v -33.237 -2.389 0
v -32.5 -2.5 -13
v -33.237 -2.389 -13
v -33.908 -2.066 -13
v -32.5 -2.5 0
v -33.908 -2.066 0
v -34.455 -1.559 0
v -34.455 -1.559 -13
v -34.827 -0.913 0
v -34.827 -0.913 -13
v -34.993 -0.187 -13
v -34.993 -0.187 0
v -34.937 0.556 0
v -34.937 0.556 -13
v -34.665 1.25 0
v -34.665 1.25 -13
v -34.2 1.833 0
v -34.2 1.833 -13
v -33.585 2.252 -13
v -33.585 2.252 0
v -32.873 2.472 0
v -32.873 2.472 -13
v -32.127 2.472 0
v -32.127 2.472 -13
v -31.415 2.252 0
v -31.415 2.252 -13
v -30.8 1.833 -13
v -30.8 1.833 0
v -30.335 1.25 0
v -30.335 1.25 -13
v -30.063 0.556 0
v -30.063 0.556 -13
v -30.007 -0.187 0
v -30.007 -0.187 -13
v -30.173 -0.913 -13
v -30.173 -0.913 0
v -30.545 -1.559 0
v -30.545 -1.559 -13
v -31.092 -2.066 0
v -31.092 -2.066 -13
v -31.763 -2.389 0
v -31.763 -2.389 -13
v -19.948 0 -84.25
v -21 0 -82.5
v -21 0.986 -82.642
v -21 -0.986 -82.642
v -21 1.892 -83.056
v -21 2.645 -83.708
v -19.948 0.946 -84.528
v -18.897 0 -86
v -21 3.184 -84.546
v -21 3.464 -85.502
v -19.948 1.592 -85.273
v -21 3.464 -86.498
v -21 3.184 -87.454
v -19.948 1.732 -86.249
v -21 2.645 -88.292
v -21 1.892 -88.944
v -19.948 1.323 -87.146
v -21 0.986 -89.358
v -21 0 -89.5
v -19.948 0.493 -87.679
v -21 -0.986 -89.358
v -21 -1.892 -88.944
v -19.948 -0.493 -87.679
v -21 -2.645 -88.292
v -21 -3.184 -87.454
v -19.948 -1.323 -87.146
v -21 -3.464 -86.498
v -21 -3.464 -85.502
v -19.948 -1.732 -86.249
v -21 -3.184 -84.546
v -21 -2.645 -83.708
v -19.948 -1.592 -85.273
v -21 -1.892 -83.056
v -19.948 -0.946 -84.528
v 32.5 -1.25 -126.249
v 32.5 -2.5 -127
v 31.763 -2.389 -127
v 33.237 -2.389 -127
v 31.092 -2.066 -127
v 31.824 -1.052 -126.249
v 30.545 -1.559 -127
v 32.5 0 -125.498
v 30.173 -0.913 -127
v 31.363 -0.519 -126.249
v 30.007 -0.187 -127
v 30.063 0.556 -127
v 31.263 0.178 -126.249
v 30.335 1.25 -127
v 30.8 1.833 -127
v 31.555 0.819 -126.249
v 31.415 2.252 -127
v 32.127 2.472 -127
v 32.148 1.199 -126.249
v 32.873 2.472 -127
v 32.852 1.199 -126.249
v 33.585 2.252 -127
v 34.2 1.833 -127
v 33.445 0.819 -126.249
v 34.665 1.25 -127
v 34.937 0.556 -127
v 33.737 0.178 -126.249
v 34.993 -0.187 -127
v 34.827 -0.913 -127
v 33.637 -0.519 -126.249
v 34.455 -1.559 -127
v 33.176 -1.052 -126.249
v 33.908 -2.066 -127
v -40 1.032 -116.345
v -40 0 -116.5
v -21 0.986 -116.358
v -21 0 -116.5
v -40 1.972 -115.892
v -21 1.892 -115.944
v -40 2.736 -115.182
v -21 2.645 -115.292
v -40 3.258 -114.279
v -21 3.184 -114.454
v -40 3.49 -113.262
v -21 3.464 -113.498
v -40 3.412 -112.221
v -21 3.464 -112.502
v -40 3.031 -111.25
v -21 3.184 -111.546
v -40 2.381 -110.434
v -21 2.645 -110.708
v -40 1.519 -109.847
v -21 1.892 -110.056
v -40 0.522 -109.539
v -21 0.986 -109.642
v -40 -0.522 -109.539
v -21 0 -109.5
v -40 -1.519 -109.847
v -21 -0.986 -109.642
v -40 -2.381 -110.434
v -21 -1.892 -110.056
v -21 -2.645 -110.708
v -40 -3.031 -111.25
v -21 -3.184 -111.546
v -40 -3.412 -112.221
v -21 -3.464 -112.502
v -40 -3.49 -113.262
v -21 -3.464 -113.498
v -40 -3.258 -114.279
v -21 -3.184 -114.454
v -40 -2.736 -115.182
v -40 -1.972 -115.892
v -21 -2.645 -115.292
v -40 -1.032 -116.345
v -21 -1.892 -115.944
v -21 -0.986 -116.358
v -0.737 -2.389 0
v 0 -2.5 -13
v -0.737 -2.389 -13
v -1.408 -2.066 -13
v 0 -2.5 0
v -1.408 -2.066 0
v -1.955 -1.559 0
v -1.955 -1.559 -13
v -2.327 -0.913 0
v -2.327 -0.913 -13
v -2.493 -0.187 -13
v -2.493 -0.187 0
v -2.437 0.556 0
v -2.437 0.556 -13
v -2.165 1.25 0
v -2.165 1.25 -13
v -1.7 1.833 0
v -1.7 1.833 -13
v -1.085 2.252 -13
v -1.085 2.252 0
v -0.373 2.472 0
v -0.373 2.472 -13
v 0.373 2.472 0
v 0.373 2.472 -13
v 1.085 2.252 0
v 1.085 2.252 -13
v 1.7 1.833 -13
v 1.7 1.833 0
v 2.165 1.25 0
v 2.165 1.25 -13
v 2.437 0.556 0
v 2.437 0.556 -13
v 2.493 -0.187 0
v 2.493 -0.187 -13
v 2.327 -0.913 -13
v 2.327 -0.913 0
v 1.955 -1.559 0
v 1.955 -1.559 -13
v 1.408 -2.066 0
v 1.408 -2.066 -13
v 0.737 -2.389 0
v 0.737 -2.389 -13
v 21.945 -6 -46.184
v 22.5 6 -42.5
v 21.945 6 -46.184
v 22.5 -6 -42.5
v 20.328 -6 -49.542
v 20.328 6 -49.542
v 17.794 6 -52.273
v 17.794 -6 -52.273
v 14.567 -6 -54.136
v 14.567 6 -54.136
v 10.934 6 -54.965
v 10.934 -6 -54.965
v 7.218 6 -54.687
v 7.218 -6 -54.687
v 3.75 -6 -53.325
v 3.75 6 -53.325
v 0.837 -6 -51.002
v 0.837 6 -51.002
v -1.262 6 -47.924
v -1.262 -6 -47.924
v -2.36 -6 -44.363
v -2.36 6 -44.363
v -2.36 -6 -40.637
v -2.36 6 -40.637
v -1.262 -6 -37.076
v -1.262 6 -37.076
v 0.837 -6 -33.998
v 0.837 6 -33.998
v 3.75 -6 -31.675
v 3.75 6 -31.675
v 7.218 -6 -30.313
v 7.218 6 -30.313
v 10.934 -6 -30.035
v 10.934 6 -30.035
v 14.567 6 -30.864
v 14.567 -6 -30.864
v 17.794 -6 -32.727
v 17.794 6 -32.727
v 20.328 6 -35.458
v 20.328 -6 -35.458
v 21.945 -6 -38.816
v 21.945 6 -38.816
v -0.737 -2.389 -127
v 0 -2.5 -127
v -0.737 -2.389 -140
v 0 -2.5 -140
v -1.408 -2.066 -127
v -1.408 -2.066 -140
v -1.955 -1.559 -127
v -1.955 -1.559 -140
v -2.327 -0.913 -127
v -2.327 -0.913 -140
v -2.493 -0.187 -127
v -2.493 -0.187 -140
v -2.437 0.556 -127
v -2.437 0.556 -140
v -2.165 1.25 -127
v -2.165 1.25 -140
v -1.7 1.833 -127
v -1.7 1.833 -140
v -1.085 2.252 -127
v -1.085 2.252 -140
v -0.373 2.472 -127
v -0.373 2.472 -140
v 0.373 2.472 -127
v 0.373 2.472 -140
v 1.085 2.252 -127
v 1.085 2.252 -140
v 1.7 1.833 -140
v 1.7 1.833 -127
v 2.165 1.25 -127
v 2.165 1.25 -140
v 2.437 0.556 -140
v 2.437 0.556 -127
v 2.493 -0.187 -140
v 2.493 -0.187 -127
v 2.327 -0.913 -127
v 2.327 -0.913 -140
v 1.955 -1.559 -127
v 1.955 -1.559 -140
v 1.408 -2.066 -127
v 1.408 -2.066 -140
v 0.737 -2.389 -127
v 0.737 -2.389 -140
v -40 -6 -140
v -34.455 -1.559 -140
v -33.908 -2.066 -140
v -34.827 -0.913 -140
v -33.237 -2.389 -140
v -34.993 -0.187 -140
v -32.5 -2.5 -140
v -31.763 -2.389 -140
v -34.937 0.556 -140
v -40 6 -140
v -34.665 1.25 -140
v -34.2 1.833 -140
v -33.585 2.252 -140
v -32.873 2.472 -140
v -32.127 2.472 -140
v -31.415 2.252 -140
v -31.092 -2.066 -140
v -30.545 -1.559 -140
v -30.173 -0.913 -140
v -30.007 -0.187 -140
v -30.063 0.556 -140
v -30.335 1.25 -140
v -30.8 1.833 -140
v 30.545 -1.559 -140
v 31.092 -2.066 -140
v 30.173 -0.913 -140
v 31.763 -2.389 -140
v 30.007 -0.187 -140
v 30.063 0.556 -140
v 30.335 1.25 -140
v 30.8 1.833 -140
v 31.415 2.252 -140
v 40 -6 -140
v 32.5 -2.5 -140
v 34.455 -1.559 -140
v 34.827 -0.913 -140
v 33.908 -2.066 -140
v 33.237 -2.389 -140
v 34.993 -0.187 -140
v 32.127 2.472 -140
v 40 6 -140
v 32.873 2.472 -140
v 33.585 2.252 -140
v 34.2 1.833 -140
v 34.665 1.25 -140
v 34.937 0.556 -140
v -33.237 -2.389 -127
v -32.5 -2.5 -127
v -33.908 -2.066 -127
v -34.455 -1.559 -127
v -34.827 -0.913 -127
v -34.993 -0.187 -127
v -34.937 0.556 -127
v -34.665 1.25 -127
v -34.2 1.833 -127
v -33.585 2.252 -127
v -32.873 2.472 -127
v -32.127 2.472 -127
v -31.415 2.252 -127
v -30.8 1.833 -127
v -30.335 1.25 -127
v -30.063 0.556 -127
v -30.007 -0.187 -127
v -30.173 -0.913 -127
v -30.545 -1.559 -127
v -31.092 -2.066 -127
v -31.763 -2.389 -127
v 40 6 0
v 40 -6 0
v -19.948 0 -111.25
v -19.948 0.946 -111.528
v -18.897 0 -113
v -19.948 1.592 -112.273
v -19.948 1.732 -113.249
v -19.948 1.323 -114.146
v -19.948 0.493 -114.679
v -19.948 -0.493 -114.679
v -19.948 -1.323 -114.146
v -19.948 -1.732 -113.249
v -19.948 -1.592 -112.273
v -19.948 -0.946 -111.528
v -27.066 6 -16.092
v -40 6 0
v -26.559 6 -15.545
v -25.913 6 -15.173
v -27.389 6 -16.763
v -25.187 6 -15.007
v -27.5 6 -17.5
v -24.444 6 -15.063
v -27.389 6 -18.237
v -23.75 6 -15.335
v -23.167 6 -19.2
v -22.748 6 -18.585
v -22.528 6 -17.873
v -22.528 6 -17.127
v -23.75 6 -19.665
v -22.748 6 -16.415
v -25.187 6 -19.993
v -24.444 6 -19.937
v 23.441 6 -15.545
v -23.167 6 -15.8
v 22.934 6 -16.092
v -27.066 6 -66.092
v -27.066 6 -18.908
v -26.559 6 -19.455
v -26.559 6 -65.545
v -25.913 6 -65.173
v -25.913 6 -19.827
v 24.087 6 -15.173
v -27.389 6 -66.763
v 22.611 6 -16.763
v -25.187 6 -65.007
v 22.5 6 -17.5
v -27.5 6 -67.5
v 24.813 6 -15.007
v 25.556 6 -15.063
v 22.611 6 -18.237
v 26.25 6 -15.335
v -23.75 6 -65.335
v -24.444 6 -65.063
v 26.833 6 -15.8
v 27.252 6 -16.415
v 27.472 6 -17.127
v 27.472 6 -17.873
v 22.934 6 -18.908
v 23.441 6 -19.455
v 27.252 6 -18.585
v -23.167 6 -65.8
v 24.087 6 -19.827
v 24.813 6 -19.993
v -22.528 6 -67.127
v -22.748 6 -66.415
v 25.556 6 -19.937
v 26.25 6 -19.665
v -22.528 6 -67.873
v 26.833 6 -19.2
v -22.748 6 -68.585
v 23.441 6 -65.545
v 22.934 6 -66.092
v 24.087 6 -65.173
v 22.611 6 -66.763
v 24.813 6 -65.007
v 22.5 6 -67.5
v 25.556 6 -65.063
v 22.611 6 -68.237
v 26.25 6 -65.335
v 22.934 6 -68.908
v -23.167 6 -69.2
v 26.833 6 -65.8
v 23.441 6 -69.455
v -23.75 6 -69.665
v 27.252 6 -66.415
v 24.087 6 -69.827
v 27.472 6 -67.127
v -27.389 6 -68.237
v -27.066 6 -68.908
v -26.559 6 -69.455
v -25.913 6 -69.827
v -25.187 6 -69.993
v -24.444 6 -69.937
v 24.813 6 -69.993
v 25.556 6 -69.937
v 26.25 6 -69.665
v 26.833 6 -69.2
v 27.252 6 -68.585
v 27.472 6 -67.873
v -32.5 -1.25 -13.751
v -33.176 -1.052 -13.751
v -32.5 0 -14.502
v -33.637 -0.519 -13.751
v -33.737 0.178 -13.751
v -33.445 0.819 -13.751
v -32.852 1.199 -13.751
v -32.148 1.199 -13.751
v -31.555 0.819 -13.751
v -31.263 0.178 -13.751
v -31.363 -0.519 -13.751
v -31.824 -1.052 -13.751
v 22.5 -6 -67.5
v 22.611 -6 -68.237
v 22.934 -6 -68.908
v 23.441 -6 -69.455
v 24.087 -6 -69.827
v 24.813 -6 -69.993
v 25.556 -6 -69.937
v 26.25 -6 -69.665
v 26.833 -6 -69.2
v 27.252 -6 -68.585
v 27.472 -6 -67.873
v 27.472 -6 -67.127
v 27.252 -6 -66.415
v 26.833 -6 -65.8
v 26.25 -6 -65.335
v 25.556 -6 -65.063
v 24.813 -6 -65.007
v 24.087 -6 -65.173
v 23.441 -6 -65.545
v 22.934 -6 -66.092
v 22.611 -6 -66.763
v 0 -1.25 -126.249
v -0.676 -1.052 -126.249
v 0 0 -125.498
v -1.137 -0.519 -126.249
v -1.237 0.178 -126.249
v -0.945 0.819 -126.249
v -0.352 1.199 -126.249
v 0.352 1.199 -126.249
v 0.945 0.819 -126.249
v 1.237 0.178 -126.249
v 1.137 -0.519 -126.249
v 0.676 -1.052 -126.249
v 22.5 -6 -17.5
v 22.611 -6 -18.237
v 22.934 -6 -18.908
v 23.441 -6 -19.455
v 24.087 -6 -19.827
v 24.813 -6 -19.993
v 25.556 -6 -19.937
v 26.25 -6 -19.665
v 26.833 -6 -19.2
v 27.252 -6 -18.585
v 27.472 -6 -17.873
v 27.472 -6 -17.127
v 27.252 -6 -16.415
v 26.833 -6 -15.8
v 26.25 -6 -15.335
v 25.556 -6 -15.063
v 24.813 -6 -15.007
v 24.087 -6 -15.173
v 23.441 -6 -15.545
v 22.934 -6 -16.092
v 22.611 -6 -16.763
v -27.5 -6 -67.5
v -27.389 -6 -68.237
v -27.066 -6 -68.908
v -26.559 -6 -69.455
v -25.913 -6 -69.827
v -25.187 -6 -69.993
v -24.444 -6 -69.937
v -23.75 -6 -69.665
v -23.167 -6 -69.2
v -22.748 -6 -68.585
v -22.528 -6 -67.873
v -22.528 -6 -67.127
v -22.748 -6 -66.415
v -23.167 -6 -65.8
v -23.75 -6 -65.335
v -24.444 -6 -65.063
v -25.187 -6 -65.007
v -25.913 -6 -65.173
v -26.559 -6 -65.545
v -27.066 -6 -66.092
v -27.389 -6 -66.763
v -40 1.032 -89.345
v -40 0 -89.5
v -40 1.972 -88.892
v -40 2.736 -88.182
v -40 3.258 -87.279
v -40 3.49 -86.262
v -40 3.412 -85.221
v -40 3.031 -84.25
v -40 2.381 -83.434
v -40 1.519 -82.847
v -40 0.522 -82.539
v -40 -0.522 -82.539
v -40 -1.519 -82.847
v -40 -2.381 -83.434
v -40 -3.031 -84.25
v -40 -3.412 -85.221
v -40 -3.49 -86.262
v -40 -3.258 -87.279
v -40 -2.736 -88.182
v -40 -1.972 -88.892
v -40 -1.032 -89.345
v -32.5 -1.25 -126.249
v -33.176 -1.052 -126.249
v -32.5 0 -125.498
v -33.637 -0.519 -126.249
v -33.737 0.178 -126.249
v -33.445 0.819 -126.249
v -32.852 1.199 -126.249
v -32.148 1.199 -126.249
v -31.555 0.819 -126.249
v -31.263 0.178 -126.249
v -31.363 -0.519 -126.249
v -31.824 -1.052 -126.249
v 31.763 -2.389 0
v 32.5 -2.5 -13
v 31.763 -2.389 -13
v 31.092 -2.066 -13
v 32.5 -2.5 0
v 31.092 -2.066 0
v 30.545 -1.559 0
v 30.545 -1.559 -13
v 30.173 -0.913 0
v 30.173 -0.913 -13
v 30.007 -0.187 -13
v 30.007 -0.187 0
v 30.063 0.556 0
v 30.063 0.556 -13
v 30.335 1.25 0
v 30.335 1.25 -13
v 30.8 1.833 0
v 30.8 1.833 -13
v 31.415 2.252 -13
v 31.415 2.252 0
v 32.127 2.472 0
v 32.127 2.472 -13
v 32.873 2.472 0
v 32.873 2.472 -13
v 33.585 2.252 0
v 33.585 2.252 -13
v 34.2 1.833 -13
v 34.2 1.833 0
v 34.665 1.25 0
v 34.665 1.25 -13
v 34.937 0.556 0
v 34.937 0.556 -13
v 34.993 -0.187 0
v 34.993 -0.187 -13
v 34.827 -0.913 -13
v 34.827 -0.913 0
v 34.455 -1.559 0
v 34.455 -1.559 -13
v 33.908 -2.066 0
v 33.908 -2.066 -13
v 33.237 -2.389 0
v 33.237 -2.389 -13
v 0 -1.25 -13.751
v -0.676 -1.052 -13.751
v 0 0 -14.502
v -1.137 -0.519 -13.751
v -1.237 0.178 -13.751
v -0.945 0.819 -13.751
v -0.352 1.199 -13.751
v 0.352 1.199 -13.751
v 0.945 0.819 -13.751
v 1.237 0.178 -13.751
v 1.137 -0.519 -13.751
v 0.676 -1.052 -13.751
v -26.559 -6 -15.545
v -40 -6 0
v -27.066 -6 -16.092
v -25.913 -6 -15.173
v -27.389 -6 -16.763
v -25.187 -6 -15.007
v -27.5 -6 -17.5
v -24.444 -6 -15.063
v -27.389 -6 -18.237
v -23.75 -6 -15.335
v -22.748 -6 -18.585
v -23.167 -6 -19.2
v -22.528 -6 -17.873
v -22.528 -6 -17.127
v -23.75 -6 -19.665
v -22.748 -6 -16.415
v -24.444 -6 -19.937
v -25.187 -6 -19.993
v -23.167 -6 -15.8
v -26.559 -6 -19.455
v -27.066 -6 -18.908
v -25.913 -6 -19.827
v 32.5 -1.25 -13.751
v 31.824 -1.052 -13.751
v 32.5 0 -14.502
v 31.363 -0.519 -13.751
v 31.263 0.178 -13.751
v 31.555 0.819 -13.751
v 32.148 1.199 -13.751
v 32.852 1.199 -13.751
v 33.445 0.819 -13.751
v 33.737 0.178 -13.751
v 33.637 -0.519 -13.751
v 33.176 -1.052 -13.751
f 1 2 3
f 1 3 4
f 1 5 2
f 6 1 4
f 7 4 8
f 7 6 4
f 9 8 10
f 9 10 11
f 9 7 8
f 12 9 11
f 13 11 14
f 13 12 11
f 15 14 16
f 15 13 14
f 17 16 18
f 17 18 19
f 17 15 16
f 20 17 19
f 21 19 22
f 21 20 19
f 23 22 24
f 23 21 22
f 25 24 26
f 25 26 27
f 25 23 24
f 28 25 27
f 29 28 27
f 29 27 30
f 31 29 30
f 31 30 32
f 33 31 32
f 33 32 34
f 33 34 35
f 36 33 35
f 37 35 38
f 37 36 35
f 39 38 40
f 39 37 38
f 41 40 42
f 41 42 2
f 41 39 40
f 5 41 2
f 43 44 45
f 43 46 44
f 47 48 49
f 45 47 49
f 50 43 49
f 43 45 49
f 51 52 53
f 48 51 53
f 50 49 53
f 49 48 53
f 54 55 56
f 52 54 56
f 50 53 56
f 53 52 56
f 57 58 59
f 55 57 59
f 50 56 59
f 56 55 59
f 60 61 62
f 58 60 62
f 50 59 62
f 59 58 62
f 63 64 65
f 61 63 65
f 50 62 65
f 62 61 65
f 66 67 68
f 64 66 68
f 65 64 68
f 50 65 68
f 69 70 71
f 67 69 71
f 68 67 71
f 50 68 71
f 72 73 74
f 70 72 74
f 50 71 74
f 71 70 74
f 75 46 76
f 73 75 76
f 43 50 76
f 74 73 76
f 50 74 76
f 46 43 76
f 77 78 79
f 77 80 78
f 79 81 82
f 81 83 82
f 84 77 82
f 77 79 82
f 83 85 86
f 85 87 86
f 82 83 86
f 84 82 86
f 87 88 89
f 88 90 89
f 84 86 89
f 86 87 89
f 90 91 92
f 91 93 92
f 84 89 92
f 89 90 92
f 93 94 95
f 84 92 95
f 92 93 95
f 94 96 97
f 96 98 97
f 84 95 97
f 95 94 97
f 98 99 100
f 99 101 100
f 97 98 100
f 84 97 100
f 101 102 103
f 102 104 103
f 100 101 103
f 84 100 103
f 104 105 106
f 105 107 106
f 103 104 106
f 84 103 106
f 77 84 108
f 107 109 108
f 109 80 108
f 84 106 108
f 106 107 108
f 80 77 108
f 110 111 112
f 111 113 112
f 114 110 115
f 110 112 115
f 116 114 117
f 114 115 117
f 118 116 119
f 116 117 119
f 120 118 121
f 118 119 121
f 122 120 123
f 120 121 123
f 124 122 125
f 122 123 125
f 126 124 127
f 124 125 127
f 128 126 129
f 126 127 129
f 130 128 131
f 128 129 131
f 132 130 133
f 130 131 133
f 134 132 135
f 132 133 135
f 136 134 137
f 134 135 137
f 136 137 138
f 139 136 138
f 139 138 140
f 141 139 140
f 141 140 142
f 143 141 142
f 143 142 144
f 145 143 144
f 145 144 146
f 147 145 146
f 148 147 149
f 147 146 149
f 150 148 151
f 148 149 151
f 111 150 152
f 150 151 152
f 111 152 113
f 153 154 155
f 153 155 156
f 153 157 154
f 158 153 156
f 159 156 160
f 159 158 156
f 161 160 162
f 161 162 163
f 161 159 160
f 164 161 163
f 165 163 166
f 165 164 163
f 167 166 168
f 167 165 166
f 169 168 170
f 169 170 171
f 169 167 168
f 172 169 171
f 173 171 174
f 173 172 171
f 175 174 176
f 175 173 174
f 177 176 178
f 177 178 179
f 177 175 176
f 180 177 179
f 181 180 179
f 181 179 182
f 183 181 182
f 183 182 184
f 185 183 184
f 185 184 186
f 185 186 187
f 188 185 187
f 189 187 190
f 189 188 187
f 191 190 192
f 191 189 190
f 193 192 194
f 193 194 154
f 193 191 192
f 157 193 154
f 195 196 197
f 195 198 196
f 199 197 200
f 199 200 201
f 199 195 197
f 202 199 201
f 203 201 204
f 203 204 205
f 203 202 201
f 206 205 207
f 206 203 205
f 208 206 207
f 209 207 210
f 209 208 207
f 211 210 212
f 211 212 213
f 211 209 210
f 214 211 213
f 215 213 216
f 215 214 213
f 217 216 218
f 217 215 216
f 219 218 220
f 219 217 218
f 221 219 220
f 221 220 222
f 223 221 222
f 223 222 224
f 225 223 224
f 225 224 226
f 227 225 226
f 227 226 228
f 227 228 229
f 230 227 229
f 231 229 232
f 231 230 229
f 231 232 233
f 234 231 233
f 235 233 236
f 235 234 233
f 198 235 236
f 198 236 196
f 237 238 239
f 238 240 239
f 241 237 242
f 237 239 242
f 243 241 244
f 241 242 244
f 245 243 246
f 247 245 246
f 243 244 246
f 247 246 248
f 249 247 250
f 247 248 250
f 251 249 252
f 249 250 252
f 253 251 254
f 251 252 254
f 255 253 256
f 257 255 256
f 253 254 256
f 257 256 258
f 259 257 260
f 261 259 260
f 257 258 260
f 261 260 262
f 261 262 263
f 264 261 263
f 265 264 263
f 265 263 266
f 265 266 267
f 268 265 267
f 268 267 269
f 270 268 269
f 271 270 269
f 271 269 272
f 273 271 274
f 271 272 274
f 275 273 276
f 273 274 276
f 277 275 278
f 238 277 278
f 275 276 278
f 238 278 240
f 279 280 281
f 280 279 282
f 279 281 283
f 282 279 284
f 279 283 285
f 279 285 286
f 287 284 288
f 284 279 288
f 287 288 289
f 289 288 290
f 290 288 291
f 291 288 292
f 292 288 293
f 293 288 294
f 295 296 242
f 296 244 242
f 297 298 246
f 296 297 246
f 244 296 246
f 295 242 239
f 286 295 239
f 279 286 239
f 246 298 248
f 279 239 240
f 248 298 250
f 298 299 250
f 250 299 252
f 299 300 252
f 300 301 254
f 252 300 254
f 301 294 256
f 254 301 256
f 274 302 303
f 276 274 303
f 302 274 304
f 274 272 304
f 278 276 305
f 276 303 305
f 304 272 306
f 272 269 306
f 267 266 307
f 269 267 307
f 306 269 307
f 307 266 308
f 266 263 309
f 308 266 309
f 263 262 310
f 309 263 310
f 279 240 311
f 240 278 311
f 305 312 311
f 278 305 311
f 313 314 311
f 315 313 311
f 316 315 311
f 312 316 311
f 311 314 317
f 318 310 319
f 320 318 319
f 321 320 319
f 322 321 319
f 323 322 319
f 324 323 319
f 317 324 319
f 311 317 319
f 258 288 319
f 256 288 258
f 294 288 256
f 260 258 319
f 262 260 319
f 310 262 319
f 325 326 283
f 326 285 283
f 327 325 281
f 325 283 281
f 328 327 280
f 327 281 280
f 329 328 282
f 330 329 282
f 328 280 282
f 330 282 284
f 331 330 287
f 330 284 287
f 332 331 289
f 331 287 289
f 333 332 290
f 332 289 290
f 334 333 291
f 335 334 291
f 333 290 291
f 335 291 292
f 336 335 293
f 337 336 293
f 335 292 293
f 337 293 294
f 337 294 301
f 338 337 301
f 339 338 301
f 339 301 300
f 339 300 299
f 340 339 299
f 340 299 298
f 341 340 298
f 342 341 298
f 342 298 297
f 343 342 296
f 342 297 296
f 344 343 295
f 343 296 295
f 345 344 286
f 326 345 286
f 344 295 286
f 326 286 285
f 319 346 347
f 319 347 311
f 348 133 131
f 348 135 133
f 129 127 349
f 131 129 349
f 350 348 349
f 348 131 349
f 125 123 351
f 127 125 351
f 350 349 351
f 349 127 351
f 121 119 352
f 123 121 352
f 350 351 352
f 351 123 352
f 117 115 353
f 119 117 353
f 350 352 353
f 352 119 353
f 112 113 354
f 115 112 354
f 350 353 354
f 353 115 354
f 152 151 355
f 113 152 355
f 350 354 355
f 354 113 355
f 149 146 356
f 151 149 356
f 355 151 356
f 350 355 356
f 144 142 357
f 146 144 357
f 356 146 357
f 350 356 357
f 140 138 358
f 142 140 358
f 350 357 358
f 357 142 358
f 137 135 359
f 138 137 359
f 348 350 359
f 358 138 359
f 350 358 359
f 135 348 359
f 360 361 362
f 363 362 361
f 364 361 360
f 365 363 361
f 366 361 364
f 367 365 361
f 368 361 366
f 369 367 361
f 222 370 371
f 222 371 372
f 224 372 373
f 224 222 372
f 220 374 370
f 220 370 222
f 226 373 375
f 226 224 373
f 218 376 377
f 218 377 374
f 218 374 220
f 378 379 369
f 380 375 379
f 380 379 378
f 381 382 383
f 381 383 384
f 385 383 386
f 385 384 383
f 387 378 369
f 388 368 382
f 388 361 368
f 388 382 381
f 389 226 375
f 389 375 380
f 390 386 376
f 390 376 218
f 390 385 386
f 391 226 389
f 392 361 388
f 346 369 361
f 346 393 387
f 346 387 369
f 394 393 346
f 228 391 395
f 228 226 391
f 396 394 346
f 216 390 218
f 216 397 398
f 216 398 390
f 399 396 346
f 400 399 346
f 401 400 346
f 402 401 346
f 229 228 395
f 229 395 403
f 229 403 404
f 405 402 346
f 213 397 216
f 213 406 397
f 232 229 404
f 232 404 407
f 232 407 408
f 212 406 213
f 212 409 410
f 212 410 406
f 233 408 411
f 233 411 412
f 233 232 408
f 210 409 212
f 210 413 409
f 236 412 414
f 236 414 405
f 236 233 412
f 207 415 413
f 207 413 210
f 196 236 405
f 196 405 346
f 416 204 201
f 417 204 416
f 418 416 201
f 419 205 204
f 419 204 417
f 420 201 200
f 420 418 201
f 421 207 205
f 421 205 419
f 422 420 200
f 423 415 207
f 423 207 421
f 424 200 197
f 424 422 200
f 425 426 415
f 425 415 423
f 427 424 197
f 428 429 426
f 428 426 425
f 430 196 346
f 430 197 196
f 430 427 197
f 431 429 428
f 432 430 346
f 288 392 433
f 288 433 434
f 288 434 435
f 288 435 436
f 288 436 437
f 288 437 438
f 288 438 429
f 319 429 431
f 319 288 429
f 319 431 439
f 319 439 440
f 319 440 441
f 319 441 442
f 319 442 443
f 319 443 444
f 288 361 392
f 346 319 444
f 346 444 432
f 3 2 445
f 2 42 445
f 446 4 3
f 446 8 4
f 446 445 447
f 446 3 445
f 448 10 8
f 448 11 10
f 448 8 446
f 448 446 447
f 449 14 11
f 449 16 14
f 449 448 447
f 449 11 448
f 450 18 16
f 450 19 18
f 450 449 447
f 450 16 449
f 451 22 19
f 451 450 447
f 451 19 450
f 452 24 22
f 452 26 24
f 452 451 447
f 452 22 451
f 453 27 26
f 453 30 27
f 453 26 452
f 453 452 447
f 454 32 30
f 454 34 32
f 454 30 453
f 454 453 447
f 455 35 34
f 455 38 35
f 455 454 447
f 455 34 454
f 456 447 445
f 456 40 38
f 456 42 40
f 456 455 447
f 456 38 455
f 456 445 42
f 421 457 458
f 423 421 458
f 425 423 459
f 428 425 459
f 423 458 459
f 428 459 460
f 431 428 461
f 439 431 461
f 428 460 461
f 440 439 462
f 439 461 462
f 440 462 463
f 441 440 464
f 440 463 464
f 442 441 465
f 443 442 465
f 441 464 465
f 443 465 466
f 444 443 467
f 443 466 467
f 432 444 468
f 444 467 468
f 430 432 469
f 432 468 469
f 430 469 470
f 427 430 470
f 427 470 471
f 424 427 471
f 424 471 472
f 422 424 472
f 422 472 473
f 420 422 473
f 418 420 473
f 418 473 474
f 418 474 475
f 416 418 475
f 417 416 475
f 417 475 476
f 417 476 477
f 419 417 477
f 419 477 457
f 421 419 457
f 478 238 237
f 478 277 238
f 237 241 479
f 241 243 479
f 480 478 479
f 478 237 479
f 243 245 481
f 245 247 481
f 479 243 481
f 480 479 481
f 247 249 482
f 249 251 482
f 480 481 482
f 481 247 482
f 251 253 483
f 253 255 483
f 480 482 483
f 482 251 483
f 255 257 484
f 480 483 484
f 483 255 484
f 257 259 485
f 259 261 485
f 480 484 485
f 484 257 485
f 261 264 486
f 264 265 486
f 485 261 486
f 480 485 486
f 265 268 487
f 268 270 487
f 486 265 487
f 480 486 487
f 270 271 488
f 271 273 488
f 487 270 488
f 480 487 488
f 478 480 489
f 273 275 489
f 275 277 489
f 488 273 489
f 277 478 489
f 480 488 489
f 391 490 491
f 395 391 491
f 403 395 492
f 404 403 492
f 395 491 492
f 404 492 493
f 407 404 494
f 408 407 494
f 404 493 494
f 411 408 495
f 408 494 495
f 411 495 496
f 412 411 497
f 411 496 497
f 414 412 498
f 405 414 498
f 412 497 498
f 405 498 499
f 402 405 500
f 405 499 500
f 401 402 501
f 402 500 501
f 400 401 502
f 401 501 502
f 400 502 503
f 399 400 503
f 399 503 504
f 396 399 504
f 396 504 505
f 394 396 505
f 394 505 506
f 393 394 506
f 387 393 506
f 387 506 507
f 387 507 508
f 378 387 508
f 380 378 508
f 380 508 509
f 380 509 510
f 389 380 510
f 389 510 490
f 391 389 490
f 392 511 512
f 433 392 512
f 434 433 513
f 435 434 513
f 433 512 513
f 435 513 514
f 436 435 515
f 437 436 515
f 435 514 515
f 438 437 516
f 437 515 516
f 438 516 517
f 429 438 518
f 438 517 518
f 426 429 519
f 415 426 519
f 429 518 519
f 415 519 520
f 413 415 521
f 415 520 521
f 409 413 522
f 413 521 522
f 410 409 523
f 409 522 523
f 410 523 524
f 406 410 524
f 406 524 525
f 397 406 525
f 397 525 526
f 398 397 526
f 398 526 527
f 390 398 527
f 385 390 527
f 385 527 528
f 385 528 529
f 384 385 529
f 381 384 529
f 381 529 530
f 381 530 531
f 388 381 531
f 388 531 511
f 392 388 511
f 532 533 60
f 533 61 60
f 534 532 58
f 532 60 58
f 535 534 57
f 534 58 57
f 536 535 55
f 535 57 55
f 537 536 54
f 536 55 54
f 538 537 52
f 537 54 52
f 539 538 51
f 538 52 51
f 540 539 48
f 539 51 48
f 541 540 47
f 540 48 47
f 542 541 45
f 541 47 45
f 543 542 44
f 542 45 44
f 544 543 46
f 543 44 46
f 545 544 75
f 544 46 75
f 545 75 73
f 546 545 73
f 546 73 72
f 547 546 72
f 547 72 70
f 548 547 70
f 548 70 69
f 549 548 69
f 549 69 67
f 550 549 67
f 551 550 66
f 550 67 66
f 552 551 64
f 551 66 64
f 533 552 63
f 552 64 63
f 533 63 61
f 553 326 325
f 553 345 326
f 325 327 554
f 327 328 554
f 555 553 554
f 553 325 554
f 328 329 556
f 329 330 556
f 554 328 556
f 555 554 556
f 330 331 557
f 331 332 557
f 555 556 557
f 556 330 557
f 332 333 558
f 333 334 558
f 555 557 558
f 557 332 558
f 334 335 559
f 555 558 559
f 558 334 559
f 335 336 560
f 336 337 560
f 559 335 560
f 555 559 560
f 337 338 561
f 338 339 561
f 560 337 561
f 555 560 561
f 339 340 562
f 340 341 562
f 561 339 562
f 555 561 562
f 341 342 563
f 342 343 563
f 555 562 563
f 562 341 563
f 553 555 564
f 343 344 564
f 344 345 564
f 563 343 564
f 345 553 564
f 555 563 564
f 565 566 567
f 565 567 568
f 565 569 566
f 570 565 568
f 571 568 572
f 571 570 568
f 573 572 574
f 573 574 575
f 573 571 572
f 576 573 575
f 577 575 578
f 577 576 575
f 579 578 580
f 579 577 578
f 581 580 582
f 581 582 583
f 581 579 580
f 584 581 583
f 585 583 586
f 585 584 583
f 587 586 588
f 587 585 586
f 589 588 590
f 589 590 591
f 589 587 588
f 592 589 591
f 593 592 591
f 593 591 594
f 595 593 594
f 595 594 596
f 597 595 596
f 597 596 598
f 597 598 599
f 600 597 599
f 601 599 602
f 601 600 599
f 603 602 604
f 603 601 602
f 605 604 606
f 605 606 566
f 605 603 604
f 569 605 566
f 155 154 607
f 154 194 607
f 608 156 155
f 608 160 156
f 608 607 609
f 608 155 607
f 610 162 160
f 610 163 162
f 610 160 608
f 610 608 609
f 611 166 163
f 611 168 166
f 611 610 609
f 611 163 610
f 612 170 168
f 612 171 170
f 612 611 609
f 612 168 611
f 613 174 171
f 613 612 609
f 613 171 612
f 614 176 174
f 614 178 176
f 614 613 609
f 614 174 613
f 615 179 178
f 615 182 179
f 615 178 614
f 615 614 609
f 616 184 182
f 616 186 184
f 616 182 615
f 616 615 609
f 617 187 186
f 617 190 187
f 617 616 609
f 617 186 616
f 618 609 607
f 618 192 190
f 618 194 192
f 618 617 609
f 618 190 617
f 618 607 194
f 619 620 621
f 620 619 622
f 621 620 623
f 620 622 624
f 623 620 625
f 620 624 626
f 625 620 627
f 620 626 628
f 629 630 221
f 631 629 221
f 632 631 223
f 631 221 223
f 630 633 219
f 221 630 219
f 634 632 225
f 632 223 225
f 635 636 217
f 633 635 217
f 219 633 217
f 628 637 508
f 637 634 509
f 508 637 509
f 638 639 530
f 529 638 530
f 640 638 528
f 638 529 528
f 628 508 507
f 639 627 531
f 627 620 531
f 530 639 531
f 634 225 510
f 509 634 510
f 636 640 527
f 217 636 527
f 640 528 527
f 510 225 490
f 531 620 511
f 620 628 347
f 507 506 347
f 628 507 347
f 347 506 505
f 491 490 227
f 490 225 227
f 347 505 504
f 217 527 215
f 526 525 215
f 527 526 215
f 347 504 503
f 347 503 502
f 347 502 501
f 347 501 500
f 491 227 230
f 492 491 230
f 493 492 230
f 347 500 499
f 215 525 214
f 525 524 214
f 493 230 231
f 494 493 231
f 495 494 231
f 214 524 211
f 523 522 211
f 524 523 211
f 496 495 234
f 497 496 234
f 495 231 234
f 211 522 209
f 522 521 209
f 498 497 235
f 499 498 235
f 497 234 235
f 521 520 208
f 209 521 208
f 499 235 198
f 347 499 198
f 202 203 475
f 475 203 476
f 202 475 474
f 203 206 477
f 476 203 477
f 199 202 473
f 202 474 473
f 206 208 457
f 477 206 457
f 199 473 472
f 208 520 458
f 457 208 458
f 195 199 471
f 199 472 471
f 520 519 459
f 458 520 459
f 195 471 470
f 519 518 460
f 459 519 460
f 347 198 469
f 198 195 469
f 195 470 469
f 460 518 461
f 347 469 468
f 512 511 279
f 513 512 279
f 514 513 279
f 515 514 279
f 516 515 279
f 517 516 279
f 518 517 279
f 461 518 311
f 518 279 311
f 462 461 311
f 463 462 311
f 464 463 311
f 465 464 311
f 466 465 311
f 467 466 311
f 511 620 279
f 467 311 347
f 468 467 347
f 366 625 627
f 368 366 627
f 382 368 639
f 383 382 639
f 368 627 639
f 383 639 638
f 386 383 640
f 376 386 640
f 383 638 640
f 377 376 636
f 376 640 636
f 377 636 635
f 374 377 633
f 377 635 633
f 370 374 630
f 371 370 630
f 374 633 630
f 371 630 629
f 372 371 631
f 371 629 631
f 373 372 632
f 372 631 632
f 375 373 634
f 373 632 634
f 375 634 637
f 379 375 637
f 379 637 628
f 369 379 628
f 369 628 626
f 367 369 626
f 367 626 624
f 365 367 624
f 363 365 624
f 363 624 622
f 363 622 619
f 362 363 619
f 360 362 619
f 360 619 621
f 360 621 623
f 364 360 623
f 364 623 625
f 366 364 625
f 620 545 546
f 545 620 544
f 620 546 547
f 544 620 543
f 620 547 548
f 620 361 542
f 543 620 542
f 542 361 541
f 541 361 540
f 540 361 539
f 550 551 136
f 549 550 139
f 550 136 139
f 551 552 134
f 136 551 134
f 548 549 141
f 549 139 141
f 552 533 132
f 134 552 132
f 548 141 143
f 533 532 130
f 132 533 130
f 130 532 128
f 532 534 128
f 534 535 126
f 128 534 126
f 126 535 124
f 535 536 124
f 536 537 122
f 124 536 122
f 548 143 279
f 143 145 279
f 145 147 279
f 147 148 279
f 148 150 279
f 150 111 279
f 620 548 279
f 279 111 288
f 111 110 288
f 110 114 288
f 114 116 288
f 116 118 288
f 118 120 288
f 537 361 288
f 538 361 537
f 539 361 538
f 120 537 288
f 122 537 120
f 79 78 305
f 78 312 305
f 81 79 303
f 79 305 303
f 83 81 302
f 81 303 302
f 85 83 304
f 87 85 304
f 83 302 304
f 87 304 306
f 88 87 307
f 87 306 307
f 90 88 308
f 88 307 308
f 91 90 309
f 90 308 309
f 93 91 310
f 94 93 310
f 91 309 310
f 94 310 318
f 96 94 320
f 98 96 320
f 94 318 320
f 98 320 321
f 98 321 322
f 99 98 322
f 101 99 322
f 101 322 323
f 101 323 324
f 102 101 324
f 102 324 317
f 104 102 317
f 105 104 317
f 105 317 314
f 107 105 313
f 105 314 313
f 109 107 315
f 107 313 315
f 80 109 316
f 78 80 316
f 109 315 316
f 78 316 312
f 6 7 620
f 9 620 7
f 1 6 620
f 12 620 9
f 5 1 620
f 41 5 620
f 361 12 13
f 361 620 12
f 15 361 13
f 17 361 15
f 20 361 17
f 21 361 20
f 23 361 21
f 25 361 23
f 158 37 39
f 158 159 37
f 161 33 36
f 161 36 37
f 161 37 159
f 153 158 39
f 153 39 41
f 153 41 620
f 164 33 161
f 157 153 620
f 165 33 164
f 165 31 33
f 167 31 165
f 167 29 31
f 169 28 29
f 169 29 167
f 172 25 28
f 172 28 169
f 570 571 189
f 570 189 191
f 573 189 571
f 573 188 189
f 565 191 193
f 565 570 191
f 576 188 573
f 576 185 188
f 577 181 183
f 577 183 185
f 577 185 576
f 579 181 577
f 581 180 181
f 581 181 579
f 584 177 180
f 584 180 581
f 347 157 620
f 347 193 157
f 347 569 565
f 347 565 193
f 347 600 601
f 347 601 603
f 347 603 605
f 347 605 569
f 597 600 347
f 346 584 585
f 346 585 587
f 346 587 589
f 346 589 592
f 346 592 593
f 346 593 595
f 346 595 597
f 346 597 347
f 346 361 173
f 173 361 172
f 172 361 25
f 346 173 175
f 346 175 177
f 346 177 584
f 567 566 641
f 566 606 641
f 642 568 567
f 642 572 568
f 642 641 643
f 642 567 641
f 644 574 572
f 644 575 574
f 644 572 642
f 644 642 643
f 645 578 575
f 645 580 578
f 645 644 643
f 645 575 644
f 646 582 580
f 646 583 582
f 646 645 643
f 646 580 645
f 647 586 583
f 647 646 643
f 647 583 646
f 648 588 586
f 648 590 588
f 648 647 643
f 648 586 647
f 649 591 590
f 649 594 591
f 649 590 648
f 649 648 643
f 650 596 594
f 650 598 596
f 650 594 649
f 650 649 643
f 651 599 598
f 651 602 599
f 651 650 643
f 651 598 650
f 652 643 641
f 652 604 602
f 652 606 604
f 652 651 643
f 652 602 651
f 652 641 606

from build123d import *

# Parameters (mm, degrees)
SKETCH1_W                  = 80
SKETCH1_H                  = 140
SKETCH1_R                  = 12.5
BOSS_EXTRUDE1_DEPTH        = 6
M6_TAPPED_HOLE1_D          = 5
M6_TAPPED_HOLE2_AT_2_COUNT = 2
M6_TAPPED_HOLE2_AT_2_PITCH = 32.5
M6_TAPPED_HOLE2_AT_3_COUNT = 2
M6_TAPPED_HOLE2_AT_3_PITCH = 65
M8X1_0_TAPPED_HOLE1_D      = 7
M8X1_0_TAPPED_HOLE1_DEPTH  = 19
M8X1_0_TAPPED_HOLE1_TIP    = 2.103012167


with BuildPart() as part:
    # Sketch1 → Boss-Extrude1 (new body, symmetric)
    with BuildSketch(Plane(origin=(0, 0, 0), x_dir=(1, 0, 0), z_dir=(0, 1, 0))):
        with Locations((0, 70)):
            Rectangle(SKETCH1_W, SKETCH1_H)
        with Locations((10, 42.5)):
            Circle(SKETCH1_R, mode=Mode.SUBTRACT)
    extrude(amount=BOSS_EXTRUDE1_DEPTH, both=True)

    # M6 Tapped Hole1 (through all)
    with Locations(Plane(origin=(0, 6, 0), x_dir=(1, 0, 0), z_dir=(0, 1, 0))):
        with Locations((-25, 67.5), (25, 67.5), (25, 17.5), (-25, 17.5)):
            Hole(M6_TAPPED_HOLE1_D / 2)

    # Sketch9 → M6 Tapped Hole2 (revolve, cut)
    with BuildSketch(Plane(origin=(32.5, 0, 0), x_dir=(0, -1, 0), z_dir=(1, 0, 0))):
        Polygon((0, 0), (0, 14.502151548), (2.5, 13), (2.5, 0), align=None)
    m6_tapped_hole2 = revolve(axis=Axis((32.5, 0, 6.35), (0, 0, -1)), mode=Mode.SUBTRACT)

    # M6 Tapped Hole2 at 2: M6 Tapped Hole2 ×2
    with Locations(*[(-i * M6_TAPPED_HOLE2_AT_2_PITCH, 0, 0) for i in range(1, M6_TAPPED_HOLE2_AT_2_COUNT)]):
        add(m6_tapped_hole2, mode=Mode.SUBTRACT)

    # M6 Tapped Hole2 at 3: M6 Tapped Hole2 ×2
    with Locations(*[(-i * M6_TAPPED_HOLE2_AT_3_PITCH, 0, 0) for i in range(1, M6_TAPPED_HOLE2_AT_3_COUNT)]):
        add(m6_tapped_hole2, mode=Mode.SUBTRACT)

    # Mirror1: M6 Tapped Hole2 across plane
    add(m6_tapped_hole2.mirror(Plane(origin=(0, 0, -70), x_dir=(1, 0, 0), z_dir=(0, 0, -1))), mode=Mode.SUBTRACT)

    # Mirror1 copy 1 sketch → Mirror1 copy 1 (revolve, cut)
    with BuildSketch(Plane(origin=(0, 0, -140), x_dir=(0, -1, 0), z_dir=(1, 0, 0))):
        Polygon((0, 0), (0, -14.502151548), (2.5, -13), (2.5, 0), align=None)
    revolve(axis=Axis((0, 0, -146.35), (0, 0, -1)), mode=Mode.SUBTRACT)

    # Mirror1 copy 2 sketch → Mirror1 copy 2 (revolve, cut)
    with BuildSketch(Plane(origin=(-32.5, 0, -140), x_dir=(0, -1, 0), z_dir=(1, 0, 0))):
        Polygon((0, 0), (0, -14.502151548), (2.5, -13), (2.5, 0), align=None)
    revolve(axis=Axis((-32.5, 0, -146.35), (0, 0, -1)), mode=Mode.SUBTRACT)

    # M8x1.0 Tapped Hole1
    with Locations(Plane.ZY.offset(40)):
        with Locations((-113, 0), (-86, 0)):
            Hole(M8X1_0_TAPPED_HOLE1_D / 2, depth=M8X1_0_TAPPED_HOLE1_DEPTH)
            with Locations((0, 0, -(M8X1_0_TAPPED_HOLE1_DEPTH + M8X1_0_TAPPED_HOLE1_TIP / 2))):  # 118° drill point
                Cone(0, M8X1_0_TAPPED_HOLE1_D / 2, M8X1_0_TAPPED_HOLE1_TIP, mode=Mode.SUBTRACT)


solid = part.part
